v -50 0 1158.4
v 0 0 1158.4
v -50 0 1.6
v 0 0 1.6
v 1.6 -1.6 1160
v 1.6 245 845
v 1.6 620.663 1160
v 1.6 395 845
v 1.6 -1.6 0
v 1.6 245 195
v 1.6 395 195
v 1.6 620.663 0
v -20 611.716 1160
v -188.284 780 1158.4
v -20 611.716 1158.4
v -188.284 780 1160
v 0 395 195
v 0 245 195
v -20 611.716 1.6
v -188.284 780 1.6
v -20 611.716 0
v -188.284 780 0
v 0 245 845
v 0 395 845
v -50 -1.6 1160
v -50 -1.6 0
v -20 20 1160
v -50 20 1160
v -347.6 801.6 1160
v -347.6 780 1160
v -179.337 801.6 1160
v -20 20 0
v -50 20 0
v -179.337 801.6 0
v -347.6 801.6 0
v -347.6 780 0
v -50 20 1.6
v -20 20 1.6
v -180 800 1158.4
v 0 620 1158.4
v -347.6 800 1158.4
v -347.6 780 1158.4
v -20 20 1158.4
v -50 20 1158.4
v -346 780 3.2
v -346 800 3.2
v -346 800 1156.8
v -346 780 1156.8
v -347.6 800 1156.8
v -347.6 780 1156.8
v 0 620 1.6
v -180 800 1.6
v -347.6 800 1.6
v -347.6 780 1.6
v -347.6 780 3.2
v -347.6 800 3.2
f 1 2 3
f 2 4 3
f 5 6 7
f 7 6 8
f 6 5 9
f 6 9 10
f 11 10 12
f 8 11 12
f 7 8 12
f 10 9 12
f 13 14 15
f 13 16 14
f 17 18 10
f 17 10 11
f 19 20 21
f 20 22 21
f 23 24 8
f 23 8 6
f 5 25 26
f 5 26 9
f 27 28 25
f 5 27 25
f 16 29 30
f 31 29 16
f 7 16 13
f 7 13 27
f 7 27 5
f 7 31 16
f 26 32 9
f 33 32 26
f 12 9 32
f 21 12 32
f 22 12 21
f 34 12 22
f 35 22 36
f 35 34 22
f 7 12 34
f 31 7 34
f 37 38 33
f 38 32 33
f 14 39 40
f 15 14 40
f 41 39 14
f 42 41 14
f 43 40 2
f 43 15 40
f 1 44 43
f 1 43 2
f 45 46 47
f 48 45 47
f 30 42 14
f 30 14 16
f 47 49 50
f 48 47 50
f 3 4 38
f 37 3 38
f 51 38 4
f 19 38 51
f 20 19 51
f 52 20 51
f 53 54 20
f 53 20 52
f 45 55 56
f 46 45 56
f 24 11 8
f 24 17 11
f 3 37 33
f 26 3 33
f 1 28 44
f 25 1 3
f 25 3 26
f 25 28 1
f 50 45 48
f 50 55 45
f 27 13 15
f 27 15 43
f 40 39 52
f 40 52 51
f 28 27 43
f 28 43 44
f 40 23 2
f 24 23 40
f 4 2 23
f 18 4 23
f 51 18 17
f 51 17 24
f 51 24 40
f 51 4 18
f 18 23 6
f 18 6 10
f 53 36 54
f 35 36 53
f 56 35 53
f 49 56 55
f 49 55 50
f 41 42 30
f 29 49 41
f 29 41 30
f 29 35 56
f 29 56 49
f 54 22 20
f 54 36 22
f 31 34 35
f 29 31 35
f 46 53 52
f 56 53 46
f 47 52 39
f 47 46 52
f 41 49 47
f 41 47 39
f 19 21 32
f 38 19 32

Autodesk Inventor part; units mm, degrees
ref_plane "YZ Plane" through (0, 0, 0) normal (1, 0, 0) x (0, 1, 0)
ref_plane "XZ Plane" through (0, 0, 0) normal (0, 1, 0) x (-1, 0, 0)
ref_plane "XY Plane" through (0, 0, 0) normal (0, 0, 1) x (1, 0, 0)
sketch "Sketch1" plane through (0, 0, 0) normal (0, 0, 1) x (1, 0, 0)
  line L0 (-347.6, 800) -> (-180, 800)
  line L1 (-180, 800) -> (0, 620)
  line L2 (-180, 800) -> (122.4624, 800) construction
  line L3 (0, 0) -> (0, 620)
  line L4 (0, 0) -> (-50, 0)
  line L5 (-50, -1.6) -> (1.6, -1.6)
  line L6 (1.6, -1.6) -> (1.6, 620.6627)
  line L7 (1.6, 620.6627) -> (-179.3373, 801.6)
  line L8 (-179.3373, 801.6) -> (-347.6, 801.6)
  line L9 (-347.6, 801.6) -> (-347.6, 800)
  line L10 (-50, 0) -> (-50, -1.6)
  dimension "d0" = 167.6
  dimension "d1" = 45
  dimension "d2" = 800
  dimension "d4" = 50
  dimension "d15" = 180
  dimension "d19" = 1.6
extrude "Extrusion1" add sketch "Sketch1" along normal blind 1160
sketch "Sketch2" plane through (0, 0, 0) normal (-1, 0, 0) x (0, 0, -1)
  line L0 (-195, -320) -> (-845, -320) construction
  line L1 (-845, -245) -> (-195, -245)
  line L2 (-195, -245) -> (-195, -395)
  line L3 (-195, -395) -> (-845, -395)
  line L4 (-845, -395) -> (-845, -245)
  point P0 (0, 0)
  dimension "d8" = 195
  dimension "d10" = 650
  dimension "d11" = 650
  dimension "d12" = 150
  dimension "d20" = 320
extrude "Extrusion3" cut sketch "Sketch2" against normal through all
sketch "Sketch3" plane through (0, 0, 0) normal (0, 0, -1) x (-1, 0, 0)
  line L0 (50, 0) -> (0, 0) projected
  line L1 (0, 0) -> (0, 620) projected
  line L2 (0, 620) -> (180, 800) projected
  line L3 (180, 800) -> (347.6, 800) projected
  line L4 (347.6, 780) -> (188.2843, 780)
  line L5 (188.2843, 780) -> (20, 611.7157)
  line L6 (20, 611.7157) -> (20, 20)
  line L7 (20, 20) -> (50, 20)
  line L8 (347.6, 780) -> (347.6, 800)
  line L9 (50, 20) -> (50, 0)
  dimension "d23" = 20
extrude "Extrusion4" add sketch "Sketch3" against normal blind 1.6
sketch "Sketch4" plane through (0, 0, 1160) normal (0, 0, 1) x (1, 0, 0)
  line L0 (0, 0) -> (-50, 0) projected
  line L1 (0, 620) -> (0, 0) projected
  line L2 (-180, 800) -> (0, 620) projected
  line L3 (-347.6, 800) -> (-180, 800) projected
  line L4 (-347.6, 800) -> (-347.6, 780) projected
  line L5 (-347.6, 780) -> (-188.2843, 780) projected
  line L6 (-188.2843, 780) -> (-20, 611.7157) projected
  line L7 (-20, 611.7157) -> (-20, 20) projected
  line L8 (-20, 20) -> (-50, 20) projected
  line L9 (-50, 20) -> (-50, 0) projected
extrude "Extrusion5" add sketch "Sketch4" against normal blind 1.6
sketch "Sketch5" plane through (-347.6, 801.6, 0) normal (-1, 0, 0) x (0, 0, 1)
  line L0 (1.6, -1.6) -> (1.6, -21.6) projected
  line L1 (1.6, -1.6) -> (1158.4, -1.6) projected
  line L2 (1158.4, -21.6) -> (1158.4, -1.6) projected
  line L3 (1.6, -21.6) -> (1158.4, -21.6)
  line L4 (0, 0) -> (0, -180.9373) projected
  point P0 (0, -801.6)
extrude "Extrusion6" add sketch "Sketch5" against normal blind 1.6
sketch "Sketch6" plane through (-347.6, 801.6, 0) normal (-1, 0, 0) x (0, 0, 1)
  line L0 (1158.4, -21.6) -> (1.6, -21.6) projected
  line L1 (580, -21.6) -> (580, 0) construction
  line L2 (0, 0) -> (1160, 0) projected
  line L3 (1.6, -1.6) -> (1158.4, -1.6) projected
  line L4 (1.6, -21.6) -> (1.6, -1.6)
  line L5 (3.2, -21.6) -> (3.2, -1.6)
  line L6 (1158.4, -1.6) -> (1158.4, -21.6)
  line L7 (1158.4, -181.6) -> (1158.4, -1.6) projected
  line L8 (1156.8, -1.6) -> (1156.8, -21.6)
  point P0 (0, -801.6)
  dimension "d30" = 1.6
  dimension "d31" = 1.6
extrude "Extrusion7" cut sketch "Sketch6" against normal blind 1.6 contours L0 L8 L3 L6 | L0 L4 L3 L5
properties part number "Cover Back" material "Steel"
